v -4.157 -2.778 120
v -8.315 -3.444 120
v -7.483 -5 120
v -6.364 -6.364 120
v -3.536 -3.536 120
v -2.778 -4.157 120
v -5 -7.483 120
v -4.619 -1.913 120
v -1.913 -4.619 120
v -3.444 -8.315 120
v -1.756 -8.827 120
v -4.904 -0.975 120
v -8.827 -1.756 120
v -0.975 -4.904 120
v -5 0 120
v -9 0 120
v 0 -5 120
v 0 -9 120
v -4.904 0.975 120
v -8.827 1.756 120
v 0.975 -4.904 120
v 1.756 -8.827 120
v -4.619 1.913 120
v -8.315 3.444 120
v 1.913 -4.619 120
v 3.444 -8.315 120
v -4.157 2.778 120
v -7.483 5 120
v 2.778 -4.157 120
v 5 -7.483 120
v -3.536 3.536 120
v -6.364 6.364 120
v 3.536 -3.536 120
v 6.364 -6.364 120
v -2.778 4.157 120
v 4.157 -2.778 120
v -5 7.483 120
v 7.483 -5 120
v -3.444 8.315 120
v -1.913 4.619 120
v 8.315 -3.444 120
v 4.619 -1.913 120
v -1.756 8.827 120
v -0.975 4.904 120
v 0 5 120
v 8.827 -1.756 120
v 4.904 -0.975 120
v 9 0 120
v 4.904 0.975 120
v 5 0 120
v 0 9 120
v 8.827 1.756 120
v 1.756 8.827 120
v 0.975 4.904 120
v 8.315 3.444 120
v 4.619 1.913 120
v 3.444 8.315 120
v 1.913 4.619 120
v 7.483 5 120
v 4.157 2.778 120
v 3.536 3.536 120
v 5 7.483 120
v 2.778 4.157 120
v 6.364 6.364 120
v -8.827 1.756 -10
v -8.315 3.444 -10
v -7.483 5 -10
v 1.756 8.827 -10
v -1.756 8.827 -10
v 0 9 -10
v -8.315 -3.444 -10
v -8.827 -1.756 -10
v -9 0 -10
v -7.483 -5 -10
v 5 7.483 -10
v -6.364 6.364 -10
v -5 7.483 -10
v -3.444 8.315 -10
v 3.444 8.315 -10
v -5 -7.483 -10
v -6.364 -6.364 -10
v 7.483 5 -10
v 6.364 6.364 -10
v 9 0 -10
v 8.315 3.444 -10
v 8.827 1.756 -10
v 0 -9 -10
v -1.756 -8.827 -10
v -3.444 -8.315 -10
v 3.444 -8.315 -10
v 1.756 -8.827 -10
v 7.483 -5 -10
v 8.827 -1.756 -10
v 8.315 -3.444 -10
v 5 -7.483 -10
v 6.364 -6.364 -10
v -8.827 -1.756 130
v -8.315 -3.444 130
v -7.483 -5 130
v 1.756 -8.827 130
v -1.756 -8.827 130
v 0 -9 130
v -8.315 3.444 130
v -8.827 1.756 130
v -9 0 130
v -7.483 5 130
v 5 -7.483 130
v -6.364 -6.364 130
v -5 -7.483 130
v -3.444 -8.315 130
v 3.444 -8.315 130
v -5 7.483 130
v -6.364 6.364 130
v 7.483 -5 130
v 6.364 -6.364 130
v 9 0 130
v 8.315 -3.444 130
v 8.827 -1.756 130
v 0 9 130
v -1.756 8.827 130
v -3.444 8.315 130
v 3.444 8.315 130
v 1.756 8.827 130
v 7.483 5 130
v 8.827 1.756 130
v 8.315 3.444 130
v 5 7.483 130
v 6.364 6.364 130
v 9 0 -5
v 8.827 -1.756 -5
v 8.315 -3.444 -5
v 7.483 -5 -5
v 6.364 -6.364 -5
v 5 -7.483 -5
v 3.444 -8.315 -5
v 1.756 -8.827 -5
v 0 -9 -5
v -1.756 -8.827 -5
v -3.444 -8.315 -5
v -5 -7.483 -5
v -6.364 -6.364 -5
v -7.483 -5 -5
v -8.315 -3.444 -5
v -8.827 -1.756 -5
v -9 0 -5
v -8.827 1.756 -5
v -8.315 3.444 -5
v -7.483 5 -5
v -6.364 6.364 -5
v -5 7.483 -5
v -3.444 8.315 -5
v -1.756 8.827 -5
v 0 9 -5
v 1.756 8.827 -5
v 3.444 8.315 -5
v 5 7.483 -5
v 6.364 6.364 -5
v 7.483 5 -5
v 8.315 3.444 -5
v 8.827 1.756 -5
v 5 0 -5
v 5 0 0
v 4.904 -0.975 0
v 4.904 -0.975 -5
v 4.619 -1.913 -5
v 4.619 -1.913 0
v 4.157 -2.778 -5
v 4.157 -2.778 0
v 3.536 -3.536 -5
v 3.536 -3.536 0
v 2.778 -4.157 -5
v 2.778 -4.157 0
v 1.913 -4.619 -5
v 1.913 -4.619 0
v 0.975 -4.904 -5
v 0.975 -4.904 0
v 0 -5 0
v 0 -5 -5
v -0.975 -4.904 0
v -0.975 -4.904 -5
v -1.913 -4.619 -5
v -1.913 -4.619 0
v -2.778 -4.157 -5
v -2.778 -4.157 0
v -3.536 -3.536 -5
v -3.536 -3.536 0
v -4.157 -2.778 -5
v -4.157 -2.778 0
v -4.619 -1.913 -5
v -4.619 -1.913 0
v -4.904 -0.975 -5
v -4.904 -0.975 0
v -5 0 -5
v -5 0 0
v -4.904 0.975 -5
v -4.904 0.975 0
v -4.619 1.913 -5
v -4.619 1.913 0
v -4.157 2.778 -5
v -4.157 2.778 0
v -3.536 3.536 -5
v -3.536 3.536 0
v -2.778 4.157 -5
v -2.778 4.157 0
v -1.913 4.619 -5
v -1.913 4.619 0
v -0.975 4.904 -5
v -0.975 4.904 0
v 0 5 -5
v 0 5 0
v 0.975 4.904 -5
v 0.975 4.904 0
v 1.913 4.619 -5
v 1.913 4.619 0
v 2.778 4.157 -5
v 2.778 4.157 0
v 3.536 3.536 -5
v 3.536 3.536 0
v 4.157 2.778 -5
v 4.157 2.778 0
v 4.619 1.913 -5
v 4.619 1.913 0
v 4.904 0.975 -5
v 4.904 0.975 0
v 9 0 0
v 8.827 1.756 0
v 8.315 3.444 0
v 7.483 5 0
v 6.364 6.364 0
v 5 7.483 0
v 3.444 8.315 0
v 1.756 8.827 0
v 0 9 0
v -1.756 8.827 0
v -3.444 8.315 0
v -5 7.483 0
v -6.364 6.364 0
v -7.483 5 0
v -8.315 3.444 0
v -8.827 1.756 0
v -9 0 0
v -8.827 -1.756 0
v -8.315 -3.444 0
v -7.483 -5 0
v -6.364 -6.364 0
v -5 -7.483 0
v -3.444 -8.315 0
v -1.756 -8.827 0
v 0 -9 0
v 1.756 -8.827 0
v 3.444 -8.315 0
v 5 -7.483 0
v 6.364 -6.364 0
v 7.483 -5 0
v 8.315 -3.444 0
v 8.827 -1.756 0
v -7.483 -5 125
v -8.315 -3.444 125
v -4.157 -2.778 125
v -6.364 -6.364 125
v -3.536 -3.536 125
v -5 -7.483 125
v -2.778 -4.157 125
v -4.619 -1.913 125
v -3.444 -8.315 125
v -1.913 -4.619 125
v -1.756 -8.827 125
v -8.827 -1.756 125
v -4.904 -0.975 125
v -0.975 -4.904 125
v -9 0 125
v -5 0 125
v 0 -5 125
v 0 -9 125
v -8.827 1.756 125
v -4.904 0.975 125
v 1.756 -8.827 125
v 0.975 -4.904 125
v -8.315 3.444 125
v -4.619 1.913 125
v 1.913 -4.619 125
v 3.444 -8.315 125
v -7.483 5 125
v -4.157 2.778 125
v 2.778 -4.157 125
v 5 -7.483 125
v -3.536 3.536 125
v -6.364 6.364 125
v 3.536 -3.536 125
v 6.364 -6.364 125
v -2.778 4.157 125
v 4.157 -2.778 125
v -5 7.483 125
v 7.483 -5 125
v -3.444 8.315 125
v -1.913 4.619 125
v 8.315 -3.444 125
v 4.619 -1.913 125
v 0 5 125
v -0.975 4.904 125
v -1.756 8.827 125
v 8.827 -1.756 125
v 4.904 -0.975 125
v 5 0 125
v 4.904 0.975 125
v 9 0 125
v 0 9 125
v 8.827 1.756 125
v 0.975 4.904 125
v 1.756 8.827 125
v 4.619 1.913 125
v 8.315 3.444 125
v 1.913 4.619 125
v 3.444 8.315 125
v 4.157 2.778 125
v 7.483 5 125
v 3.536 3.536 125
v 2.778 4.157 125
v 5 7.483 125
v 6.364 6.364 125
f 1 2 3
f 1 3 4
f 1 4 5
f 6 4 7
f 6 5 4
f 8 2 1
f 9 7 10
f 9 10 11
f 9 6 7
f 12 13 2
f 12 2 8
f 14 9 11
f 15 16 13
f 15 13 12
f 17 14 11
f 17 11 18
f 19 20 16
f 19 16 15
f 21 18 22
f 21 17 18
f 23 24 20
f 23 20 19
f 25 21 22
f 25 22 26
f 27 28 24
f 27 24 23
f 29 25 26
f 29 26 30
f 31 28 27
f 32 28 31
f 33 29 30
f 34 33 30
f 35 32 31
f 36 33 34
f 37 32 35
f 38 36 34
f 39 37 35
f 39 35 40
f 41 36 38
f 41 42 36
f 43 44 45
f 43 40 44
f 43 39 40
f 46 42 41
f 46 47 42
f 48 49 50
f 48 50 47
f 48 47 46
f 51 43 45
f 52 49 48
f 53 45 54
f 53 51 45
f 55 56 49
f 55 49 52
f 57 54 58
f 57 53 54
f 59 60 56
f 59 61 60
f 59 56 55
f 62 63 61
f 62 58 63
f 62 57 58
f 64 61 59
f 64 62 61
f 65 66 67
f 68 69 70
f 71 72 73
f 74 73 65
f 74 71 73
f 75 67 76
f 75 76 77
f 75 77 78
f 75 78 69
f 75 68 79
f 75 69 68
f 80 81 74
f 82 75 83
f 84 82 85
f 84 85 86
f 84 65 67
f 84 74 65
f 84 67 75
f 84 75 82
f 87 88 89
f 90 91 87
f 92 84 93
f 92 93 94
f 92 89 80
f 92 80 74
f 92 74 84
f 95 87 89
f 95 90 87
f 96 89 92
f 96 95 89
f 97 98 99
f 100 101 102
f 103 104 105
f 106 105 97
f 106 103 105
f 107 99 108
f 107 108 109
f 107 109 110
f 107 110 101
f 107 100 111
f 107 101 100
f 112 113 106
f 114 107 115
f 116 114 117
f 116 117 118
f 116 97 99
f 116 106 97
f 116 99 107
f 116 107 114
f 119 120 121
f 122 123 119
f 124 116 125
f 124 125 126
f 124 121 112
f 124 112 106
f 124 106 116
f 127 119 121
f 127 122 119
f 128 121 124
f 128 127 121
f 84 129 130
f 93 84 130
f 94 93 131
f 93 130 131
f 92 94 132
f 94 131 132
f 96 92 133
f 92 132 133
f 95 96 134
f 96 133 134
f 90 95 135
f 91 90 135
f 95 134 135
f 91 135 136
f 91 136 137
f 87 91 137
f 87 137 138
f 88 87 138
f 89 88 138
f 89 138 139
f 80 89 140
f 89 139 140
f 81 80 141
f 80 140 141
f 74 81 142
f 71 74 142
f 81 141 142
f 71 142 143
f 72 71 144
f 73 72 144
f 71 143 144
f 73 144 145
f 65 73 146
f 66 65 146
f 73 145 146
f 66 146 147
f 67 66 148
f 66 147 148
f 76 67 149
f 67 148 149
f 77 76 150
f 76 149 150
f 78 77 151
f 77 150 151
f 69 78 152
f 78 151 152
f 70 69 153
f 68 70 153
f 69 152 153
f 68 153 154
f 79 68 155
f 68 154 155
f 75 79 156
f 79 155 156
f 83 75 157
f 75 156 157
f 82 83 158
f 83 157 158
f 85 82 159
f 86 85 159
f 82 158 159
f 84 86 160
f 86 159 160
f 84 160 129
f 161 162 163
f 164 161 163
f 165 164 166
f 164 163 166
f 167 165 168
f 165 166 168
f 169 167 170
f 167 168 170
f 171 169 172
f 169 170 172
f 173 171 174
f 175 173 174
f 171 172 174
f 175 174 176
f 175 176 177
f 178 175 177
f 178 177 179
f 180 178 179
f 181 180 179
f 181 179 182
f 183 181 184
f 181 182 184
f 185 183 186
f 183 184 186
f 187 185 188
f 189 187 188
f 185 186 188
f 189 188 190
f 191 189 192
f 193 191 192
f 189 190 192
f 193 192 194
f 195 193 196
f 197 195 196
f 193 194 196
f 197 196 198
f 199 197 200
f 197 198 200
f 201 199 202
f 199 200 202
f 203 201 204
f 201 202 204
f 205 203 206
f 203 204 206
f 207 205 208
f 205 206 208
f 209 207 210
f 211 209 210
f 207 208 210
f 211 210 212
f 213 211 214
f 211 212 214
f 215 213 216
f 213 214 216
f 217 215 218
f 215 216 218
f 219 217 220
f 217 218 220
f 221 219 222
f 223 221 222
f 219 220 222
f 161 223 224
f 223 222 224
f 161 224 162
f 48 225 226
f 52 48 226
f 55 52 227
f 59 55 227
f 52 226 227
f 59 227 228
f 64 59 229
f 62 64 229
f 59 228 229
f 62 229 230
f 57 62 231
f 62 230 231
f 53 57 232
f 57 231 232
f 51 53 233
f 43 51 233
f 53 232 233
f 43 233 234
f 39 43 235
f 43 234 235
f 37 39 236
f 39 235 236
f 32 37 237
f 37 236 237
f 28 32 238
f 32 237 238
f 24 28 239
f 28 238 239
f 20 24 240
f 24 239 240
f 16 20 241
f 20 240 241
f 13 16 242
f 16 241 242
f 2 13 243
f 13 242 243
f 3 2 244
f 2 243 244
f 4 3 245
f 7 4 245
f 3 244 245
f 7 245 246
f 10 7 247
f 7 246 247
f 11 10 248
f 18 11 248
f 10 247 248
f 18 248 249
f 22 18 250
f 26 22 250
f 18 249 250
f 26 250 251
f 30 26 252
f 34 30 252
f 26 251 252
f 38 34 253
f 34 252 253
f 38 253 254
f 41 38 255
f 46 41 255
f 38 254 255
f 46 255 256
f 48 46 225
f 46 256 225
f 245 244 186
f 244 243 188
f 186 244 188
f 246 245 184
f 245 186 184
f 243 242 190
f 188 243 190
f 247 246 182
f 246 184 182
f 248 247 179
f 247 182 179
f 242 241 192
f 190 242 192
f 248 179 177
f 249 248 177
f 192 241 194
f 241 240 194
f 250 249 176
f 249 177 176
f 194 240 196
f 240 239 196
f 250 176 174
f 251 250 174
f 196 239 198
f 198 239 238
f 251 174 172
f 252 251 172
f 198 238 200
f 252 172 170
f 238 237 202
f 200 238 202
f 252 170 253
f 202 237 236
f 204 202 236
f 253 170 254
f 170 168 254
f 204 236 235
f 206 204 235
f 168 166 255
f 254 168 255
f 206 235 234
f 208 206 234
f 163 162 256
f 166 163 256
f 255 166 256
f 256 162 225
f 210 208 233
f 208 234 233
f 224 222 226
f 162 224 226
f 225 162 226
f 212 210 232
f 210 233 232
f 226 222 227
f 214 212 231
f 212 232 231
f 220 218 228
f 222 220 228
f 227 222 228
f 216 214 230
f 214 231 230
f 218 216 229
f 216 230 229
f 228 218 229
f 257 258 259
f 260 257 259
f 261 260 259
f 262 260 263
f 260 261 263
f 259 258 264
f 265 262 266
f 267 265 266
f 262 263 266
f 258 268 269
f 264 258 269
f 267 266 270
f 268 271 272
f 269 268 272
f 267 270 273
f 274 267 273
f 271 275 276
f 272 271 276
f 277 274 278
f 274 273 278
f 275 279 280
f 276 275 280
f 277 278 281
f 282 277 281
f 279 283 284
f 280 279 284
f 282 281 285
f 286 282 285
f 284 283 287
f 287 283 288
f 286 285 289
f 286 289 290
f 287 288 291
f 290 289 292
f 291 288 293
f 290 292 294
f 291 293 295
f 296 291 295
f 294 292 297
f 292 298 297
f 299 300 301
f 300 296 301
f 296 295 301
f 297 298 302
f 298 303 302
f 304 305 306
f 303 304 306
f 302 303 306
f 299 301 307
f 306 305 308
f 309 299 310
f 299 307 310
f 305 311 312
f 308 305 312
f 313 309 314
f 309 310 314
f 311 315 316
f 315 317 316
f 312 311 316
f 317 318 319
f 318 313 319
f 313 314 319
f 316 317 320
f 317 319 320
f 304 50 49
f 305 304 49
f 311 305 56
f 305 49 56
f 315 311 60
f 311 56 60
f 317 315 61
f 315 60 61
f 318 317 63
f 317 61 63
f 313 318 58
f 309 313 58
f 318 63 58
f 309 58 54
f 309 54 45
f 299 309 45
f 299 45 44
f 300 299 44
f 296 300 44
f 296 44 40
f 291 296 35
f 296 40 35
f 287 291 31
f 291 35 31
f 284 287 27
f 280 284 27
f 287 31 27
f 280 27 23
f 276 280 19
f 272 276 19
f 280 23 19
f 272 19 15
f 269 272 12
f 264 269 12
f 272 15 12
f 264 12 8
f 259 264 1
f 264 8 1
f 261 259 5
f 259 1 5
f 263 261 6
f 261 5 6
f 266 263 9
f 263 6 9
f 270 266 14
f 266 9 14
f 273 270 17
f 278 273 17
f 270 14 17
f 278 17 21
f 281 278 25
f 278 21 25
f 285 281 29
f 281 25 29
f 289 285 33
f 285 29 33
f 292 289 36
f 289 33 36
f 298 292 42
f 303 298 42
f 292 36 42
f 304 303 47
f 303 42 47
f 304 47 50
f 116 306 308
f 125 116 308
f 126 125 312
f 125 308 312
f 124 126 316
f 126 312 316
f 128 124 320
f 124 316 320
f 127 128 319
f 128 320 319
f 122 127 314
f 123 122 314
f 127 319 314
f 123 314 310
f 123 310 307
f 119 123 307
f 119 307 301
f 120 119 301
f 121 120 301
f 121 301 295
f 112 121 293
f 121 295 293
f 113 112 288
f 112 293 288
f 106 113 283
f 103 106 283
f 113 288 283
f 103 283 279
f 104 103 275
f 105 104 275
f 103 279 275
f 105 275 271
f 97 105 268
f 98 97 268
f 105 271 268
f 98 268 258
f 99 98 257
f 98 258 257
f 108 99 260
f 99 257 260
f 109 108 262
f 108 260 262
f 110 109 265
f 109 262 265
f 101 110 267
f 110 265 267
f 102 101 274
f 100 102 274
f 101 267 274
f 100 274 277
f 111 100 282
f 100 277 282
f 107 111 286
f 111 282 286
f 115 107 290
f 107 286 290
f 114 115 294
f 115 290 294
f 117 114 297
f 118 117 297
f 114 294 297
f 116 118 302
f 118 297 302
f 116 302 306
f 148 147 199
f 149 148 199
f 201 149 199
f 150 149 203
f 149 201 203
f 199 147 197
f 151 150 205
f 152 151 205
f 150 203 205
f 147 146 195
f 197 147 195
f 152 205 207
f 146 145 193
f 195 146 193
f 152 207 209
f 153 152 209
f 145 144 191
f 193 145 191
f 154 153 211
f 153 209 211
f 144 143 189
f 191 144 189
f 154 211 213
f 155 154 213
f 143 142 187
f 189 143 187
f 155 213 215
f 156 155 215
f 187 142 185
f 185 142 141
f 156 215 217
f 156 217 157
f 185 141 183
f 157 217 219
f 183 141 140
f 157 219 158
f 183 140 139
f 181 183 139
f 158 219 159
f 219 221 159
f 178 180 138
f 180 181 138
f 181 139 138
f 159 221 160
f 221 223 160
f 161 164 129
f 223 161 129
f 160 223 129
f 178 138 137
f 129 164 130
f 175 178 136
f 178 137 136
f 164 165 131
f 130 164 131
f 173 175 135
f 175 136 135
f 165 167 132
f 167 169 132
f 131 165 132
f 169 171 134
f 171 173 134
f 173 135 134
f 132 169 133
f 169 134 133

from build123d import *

# Parameters (mm, degrees)
F0_R     = 9
F1_DEPTH = 120
F2_R     = 5
F3_DEPTH = 5
F4_R     = 9
F4_R_2   = 5
F5_DEPTH = 5
F6_R     = 5
F7_DEPTH = 5
F8_R     = 9
F8_R_2   = 5
F9_DEPTH = 5


with BuildPart() as f1:
    # F0 (on Top) → F1 (new body)
    with BuildSketch(Plane.XY):
        Circle(F0_R)
    extrude(amount=F1_DEPTH)

    # F2 (on face) → F3 (join)
    with BuildSketch(Plane.XY.offset(120)):
        Circle(F2_R)
    extrude(amount=F3_DEPTH)

    # F4 (on face) → F5 (join)
    with BuildSketch(Plane.XY.offset(125)):
        Circle(F4_R)
        Circle(F4_R_2, mode=Mode.SUBTRACT)
        Circle(F4_R_2)
    extrude(amount=F5_DEPTH)

    # F6 (on face) → F7 (join)
    with BuildSketch(Plane(origin=(0, 0, 0), x_dir=(1, 0, 0), z_dir=(0, 0, -1))):
        Circle(F6_R)
    extrude(amount=F7_DEPTH)

    # F8 (on face) → F9 (join)
    with BuildSketch(Plane(origin=(0, 0, -5), x_dir=(1, 0, 0), z_dir=(0, 0, -1))):
        Circle(F8_R)
        Circle(F8_R_2, mode=Mode.SUBTRACT)
        Circle(F8_R_2)
    extrude(amount=F9_DEPTH)


solid = f1.part
